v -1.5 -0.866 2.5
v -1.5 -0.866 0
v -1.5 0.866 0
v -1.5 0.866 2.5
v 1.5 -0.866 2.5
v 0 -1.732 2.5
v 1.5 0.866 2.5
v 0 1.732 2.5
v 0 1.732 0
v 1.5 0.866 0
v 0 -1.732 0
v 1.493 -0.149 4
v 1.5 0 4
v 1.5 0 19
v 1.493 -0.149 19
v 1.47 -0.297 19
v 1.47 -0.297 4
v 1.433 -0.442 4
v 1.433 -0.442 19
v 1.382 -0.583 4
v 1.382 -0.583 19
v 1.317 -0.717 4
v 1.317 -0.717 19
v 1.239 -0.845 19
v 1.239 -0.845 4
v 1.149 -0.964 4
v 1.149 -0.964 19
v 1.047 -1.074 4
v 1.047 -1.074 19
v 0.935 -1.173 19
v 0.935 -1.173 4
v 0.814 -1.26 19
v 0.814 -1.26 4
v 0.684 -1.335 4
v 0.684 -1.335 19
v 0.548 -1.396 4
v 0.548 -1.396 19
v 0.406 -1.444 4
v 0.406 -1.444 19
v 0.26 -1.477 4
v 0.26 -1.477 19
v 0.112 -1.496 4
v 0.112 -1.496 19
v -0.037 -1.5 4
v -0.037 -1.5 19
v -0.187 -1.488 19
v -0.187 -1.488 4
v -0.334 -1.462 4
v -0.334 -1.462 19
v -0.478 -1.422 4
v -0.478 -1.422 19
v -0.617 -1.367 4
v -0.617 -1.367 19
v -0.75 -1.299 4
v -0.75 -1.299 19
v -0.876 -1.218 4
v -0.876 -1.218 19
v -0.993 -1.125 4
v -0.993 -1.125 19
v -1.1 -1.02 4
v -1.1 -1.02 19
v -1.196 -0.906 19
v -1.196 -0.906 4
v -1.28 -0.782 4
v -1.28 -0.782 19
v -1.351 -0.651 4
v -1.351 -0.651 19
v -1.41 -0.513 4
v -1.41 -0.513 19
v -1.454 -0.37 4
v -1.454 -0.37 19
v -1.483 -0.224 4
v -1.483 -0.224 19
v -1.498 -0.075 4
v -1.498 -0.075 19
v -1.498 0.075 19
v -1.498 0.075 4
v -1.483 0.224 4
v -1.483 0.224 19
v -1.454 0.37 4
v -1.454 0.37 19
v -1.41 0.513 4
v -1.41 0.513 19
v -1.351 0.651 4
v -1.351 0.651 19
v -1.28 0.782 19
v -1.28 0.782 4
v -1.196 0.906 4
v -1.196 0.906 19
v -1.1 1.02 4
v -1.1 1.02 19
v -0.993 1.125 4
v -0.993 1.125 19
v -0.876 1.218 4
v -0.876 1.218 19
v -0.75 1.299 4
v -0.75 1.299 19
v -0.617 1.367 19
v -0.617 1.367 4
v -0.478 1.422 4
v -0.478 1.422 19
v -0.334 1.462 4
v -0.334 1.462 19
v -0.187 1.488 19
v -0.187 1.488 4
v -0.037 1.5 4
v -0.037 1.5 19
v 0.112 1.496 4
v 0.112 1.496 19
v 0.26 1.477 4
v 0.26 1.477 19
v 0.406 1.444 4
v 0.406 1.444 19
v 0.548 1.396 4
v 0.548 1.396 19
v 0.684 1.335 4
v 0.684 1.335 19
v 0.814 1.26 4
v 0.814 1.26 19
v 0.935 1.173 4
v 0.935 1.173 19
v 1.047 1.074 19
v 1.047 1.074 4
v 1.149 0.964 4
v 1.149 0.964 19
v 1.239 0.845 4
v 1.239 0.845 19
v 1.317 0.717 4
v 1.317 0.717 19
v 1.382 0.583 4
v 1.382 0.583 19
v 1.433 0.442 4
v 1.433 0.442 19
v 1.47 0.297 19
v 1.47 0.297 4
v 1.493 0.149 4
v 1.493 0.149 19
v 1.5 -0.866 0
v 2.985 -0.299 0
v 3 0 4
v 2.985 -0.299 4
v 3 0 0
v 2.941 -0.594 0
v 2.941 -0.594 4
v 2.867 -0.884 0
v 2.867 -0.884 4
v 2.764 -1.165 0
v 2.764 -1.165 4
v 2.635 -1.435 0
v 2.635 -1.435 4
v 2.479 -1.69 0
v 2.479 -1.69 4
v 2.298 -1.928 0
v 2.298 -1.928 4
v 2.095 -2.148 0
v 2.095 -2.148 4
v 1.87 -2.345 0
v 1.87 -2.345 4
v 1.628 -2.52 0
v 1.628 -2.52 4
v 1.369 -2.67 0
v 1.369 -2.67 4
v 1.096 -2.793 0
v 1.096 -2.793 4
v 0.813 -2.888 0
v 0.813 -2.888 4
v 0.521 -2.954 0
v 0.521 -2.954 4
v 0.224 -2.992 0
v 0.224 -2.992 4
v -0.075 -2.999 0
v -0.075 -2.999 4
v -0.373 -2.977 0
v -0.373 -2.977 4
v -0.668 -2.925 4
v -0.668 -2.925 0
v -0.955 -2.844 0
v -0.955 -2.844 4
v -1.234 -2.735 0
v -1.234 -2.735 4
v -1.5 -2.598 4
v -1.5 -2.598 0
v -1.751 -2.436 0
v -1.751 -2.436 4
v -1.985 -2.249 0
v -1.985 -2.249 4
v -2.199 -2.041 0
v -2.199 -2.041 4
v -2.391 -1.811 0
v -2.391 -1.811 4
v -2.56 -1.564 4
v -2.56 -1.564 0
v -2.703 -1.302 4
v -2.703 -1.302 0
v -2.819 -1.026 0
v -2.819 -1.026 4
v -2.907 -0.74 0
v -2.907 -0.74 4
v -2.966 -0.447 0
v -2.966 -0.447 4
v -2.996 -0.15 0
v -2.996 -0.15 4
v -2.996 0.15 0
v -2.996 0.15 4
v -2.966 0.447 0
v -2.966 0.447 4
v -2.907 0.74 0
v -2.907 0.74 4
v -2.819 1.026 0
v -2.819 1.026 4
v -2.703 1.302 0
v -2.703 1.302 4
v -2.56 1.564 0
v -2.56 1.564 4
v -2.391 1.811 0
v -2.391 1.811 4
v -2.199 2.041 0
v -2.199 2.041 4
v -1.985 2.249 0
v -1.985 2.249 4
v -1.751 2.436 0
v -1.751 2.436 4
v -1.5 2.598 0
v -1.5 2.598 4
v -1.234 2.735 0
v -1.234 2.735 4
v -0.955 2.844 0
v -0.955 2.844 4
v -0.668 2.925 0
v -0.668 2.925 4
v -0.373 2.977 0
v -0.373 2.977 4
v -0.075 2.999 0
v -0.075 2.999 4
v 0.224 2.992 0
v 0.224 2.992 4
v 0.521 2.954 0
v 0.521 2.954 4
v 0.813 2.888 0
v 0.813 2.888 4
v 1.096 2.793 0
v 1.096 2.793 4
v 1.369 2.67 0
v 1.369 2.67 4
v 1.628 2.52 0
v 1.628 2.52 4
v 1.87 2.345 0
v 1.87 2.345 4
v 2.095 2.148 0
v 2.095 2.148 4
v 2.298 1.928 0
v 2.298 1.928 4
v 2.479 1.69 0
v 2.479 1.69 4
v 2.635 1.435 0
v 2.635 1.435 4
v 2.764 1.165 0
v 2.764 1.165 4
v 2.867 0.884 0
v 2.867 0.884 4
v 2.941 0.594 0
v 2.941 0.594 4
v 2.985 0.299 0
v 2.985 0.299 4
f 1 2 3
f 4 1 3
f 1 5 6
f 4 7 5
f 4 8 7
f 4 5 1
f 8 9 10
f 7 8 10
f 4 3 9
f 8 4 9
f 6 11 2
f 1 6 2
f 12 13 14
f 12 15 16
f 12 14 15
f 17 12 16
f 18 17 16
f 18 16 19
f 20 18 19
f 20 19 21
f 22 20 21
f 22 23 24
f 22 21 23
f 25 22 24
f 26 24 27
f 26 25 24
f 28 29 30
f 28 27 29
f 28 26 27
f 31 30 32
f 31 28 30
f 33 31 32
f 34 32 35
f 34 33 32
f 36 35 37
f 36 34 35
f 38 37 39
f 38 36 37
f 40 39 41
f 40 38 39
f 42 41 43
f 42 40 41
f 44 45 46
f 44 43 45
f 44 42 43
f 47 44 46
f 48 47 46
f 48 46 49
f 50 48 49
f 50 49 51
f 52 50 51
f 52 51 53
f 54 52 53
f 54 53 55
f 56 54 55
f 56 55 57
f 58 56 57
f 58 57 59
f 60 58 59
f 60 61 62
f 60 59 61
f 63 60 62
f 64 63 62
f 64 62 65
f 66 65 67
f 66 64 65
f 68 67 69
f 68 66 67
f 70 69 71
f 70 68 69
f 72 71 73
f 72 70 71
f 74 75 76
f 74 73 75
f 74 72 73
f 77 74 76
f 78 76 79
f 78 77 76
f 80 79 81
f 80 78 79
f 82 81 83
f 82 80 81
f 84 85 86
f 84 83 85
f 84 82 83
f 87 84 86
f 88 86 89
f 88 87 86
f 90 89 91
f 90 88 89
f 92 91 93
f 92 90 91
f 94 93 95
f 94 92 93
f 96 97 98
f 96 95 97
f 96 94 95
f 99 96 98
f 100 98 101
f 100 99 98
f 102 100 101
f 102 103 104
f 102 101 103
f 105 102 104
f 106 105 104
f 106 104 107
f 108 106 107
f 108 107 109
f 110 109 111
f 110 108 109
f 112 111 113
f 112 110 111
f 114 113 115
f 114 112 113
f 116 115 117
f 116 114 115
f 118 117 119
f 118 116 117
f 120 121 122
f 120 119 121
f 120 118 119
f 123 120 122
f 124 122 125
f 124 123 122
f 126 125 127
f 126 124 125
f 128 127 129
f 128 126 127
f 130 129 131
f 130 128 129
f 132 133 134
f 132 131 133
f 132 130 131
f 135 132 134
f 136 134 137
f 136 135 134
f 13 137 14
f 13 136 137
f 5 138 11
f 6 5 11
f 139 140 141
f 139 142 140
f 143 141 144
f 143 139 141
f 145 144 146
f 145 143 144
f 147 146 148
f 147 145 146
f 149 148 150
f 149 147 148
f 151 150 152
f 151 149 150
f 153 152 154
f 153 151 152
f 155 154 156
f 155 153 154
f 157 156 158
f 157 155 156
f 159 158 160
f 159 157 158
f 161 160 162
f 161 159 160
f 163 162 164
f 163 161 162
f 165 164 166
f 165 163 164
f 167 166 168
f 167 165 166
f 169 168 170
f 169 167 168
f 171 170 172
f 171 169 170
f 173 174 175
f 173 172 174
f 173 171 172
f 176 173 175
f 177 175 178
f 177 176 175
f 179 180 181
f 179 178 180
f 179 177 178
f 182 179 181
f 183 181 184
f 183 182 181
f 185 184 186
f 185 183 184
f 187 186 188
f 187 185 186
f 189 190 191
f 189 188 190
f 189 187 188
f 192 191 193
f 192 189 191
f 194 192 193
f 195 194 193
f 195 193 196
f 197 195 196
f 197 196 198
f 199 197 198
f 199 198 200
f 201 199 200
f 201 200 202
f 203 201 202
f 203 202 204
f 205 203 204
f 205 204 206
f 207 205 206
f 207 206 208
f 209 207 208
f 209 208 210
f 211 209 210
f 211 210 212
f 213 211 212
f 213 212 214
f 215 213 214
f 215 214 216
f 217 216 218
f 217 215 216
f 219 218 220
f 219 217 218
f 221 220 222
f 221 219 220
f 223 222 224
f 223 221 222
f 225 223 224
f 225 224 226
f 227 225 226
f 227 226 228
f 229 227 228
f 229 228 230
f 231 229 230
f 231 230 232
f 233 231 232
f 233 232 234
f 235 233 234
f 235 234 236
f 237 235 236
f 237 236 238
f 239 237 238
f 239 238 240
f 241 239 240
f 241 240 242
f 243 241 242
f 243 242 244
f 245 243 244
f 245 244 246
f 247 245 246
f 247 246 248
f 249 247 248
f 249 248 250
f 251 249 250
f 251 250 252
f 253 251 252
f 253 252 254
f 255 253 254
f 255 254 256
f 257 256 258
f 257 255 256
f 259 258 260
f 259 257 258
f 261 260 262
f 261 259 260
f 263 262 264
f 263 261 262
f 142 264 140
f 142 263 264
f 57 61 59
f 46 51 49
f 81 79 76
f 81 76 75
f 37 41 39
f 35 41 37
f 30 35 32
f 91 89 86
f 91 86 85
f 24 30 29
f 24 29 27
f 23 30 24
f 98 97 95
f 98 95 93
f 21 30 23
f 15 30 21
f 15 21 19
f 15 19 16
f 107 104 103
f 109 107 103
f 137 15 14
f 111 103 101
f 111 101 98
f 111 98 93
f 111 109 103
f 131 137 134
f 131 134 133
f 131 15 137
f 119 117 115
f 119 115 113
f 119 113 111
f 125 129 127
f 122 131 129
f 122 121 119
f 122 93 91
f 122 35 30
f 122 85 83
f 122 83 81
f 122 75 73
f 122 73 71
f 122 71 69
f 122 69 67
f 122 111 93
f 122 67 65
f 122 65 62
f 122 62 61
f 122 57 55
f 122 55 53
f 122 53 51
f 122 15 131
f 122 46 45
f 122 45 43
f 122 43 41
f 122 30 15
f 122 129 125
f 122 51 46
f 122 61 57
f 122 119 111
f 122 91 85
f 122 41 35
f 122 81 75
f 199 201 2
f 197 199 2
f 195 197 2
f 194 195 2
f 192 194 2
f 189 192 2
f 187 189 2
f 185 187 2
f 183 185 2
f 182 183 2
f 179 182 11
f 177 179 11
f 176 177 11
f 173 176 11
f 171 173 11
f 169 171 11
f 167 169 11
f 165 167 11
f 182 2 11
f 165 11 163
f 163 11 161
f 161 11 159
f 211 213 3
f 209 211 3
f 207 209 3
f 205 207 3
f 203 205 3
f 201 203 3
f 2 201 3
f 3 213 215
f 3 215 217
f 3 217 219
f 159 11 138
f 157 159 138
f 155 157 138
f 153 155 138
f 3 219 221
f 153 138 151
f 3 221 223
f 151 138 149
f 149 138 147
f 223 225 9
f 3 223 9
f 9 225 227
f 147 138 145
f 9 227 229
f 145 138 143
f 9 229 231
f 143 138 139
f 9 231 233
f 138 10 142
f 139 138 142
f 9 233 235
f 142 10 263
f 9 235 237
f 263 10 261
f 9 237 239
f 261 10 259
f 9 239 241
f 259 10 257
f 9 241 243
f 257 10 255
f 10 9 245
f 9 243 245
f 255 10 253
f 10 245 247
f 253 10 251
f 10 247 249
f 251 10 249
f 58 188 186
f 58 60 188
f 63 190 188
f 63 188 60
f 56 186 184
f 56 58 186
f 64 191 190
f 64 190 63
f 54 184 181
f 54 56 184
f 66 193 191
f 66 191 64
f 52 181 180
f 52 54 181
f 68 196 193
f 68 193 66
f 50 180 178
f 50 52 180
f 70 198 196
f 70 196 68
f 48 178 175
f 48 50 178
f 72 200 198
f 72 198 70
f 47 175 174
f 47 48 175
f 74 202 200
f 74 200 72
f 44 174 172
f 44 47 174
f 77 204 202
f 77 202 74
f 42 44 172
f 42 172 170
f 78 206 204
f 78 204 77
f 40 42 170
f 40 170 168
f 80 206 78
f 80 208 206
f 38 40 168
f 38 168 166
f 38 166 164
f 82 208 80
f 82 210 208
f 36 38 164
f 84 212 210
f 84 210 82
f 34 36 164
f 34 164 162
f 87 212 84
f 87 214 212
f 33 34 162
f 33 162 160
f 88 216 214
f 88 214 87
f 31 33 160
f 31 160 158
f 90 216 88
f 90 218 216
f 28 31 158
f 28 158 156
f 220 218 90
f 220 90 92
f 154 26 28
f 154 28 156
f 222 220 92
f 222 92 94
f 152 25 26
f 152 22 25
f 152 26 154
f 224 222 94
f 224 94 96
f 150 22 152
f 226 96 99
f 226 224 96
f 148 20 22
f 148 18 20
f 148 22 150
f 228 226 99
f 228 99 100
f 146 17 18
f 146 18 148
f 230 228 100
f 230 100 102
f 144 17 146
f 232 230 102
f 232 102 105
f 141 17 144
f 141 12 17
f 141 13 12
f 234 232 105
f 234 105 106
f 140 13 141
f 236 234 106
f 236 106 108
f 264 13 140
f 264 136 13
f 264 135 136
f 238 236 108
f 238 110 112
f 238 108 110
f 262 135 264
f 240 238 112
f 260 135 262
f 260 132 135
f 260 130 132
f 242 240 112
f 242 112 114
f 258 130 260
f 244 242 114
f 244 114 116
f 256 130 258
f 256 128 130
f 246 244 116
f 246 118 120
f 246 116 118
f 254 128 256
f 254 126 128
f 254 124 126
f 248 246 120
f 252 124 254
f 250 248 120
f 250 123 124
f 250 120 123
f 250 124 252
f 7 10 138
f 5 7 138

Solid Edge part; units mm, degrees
sketch "Sketch1" plane through (0, 0, 0) normal (0, 0, 1) x (1, 0, 0)
  circle A0 centre (0, 0) radius 3
  dimension "D1" = 6
extrude "Protrusion1" add sketch "Sketch1" along normal blind 4
sketch "Sketch2" plane through (0, 0, 4) normal (0, 0, 1) x (1, 0, 0)
  circle A0 centre (0, 0) radius 1.5
  dimension "D1" = 3
extrude "Bult" add sketch "Sketch2" along normal blind 15
sketch "Sketch3" plane through (0, 0, 0) normal (0, 0, -1) x (1, 0, 0)
  line L0 (1.5, 0.866) -> (0, 1.7321)
  line L1 (0, 1.7321) -> (-1.5, 0.866)
  line L2 (-1.5, 0.866) -> (-1.5, -0.866)
  line L3 (-1.5, -0.866) -> (0, -1.7321)
  line L4 (0, -1.7321) -> (1.5, -0.866)
  line L5 (1.5, -0.866) -> (1.5, 0.866)
  dimension "D1" = 3
  dimension "D2" = 1.5
extrude "Försänkning_skruv" cut sketch "Sketch3" against normal blind 2.5
